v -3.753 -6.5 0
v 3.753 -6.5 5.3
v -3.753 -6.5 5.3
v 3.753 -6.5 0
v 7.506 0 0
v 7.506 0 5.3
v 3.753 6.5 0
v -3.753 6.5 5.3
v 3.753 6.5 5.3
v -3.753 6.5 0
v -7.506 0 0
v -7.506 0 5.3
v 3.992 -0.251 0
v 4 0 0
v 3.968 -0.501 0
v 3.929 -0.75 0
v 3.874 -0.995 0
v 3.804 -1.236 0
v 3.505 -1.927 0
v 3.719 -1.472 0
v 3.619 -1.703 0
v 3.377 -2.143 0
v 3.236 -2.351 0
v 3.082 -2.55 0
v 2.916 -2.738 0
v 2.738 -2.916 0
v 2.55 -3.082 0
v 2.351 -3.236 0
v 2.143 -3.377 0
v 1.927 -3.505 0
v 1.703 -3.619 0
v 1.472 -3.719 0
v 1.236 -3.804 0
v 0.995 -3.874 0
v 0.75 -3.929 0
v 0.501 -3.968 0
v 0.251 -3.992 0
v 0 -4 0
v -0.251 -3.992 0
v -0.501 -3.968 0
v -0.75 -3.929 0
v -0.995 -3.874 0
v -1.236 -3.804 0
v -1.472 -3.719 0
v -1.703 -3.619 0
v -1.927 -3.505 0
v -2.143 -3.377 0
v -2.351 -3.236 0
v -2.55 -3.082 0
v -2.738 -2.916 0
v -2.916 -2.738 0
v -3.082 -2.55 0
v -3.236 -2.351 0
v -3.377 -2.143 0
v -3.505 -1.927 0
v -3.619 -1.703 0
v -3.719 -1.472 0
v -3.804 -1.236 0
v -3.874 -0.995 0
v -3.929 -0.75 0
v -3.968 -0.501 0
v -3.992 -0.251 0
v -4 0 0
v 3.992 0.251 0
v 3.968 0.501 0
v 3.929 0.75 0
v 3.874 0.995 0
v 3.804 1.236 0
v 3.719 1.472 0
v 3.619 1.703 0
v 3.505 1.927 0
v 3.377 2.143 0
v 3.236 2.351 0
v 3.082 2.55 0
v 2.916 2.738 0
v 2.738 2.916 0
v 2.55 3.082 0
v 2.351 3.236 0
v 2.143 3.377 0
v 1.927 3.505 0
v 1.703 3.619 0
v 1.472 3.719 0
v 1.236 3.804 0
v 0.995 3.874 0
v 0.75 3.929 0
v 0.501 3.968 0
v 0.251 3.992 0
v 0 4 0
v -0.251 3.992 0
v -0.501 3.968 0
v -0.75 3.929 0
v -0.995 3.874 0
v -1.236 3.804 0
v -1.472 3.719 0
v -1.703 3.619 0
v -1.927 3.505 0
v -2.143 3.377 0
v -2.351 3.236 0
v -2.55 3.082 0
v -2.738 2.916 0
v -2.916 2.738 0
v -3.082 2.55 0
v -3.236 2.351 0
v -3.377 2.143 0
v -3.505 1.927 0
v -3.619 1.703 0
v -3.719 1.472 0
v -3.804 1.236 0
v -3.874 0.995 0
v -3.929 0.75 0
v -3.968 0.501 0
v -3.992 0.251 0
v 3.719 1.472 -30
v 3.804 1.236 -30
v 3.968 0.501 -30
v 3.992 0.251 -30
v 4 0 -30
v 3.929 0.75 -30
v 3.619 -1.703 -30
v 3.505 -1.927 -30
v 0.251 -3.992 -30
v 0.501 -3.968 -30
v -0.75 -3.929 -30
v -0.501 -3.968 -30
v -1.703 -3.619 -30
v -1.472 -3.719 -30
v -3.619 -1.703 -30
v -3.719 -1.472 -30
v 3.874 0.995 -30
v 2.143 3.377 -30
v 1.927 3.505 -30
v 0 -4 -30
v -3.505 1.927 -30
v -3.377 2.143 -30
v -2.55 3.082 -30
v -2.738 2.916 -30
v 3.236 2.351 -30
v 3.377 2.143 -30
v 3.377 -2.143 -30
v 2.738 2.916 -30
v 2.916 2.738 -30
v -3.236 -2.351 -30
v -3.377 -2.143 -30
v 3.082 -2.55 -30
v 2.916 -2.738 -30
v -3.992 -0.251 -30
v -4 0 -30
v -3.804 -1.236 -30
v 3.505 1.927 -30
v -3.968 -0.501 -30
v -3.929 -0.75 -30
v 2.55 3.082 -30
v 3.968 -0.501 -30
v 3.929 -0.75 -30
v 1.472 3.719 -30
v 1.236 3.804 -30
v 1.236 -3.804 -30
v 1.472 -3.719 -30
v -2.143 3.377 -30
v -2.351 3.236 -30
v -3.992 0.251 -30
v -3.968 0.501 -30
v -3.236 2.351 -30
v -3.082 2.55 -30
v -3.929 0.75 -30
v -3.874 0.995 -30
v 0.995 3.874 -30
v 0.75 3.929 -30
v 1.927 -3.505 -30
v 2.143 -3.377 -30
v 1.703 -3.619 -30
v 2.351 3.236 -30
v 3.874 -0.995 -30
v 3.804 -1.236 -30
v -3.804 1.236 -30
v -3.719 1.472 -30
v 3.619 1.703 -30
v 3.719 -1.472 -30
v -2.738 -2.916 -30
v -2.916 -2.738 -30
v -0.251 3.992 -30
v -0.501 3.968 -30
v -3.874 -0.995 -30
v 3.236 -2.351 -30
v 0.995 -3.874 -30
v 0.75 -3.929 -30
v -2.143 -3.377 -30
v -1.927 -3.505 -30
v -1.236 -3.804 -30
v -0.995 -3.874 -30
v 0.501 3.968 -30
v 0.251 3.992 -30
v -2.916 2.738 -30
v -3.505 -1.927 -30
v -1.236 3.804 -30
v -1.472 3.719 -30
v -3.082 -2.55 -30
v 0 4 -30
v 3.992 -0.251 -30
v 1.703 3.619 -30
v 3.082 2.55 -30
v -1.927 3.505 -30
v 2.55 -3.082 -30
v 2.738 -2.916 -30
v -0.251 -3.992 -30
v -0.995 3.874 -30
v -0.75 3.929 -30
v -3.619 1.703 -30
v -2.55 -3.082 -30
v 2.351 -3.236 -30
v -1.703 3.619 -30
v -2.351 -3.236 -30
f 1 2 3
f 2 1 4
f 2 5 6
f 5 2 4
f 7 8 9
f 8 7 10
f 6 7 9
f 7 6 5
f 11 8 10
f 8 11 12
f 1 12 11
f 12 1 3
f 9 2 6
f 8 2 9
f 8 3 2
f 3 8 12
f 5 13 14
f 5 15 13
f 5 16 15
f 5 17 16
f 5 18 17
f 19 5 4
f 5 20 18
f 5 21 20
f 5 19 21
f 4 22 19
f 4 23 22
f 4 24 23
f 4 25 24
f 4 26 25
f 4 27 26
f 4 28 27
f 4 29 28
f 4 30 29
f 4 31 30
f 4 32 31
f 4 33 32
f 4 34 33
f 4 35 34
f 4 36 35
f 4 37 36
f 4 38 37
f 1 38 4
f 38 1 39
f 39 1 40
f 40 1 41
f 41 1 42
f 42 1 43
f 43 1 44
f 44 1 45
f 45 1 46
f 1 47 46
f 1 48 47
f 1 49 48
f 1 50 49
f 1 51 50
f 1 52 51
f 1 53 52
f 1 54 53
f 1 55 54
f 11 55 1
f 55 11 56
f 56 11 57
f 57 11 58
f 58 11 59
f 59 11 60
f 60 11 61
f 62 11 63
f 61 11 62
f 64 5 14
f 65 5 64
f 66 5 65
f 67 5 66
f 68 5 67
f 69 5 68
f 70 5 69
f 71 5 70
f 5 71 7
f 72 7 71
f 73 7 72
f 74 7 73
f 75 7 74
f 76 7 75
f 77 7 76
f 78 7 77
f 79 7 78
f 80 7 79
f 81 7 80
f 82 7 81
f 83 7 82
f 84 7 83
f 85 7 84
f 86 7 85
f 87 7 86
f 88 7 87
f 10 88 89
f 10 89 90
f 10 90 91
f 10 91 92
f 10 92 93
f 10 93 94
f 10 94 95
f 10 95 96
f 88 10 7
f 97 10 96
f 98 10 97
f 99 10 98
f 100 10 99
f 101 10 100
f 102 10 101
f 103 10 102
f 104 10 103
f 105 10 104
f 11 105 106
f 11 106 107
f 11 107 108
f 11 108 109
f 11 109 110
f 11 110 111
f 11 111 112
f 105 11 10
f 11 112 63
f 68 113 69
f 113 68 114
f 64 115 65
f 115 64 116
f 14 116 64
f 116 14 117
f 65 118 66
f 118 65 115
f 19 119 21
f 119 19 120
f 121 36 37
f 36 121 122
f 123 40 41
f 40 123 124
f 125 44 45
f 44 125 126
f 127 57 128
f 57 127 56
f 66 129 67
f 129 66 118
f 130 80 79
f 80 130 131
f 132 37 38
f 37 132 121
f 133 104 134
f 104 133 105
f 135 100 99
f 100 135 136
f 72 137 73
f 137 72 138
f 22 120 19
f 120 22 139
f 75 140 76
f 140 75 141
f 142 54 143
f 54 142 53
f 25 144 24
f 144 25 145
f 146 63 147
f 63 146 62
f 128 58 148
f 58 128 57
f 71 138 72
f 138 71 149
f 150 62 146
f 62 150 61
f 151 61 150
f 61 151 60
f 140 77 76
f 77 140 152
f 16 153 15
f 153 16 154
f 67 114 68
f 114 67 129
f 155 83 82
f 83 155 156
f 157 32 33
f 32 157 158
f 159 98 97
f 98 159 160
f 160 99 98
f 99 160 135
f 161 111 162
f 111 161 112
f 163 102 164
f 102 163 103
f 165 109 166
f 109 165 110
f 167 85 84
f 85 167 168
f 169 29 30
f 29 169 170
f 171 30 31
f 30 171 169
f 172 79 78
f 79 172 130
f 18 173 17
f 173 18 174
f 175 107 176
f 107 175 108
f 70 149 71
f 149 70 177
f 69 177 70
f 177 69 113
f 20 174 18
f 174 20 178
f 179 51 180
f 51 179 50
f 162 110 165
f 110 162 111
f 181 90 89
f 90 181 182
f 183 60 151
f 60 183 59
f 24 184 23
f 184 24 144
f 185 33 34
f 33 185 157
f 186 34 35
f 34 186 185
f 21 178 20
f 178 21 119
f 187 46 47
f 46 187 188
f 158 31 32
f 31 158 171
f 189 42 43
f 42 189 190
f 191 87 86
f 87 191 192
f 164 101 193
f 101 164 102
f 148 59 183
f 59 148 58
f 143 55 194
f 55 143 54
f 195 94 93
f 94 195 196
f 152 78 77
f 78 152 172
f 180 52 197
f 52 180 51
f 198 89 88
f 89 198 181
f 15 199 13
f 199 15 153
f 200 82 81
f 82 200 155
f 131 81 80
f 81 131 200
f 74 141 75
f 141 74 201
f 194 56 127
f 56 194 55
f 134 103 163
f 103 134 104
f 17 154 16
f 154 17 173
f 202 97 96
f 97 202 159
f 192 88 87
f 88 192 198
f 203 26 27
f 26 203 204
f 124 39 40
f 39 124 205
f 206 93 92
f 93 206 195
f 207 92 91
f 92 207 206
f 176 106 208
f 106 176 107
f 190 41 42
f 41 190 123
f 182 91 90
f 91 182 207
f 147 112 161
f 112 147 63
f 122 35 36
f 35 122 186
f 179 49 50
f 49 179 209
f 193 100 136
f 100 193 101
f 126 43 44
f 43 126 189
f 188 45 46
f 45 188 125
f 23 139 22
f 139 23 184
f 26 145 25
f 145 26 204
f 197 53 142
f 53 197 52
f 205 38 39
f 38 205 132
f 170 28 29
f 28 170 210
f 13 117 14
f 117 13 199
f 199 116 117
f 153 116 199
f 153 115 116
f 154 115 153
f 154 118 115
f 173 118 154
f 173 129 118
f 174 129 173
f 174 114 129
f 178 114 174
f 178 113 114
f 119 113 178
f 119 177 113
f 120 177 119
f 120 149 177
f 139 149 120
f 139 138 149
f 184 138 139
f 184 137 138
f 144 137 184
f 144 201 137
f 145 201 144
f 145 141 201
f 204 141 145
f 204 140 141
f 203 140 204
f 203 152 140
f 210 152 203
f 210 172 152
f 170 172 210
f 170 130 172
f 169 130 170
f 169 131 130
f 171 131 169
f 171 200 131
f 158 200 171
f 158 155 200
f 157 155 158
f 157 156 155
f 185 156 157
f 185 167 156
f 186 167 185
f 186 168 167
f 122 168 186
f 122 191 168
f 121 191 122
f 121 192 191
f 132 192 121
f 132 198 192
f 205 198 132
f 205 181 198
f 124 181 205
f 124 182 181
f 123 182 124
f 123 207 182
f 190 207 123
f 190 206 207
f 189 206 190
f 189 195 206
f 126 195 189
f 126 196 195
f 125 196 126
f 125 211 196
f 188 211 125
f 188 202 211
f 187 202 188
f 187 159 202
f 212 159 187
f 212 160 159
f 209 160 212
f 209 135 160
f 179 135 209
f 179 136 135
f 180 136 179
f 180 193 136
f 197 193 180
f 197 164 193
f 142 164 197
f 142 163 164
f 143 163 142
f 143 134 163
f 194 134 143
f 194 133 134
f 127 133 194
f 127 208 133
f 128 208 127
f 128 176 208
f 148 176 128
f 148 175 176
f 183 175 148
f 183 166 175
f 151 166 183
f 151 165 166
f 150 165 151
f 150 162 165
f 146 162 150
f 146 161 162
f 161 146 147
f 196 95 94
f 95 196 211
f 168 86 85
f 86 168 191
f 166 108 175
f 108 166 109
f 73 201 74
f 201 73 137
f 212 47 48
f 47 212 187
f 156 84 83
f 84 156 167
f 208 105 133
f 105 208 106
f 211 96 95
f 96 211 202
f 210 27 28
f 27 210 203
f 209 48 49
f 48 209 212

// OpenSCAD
// M8 六角ボルト (JIS規格ベース、ねじ山省略)
// `$fn = 100;` で円や六角形の解像度を上げています。

module m8_bolt() {
    // 頭部 (対辺距離 13mm の六角柱、高さ 5.3mm)
    // OpenSCad の cylinder(r/d, h) で $fn=6 を指定すると六角柱になります。
    // 対辺距離(S)から外接円の半径を計算: R = S / sqrt(3) 
    // 13 / 1.7320508... ≒ 7.5055mm (直径では約 15.01mm)
    // ※あるいは circum(r) を使う簡易的な方法として d = 13 / cos(30) = 15.011 も可
    // ここでは正確に対辺距離 13mm になるよう三角関数を使用します。
    
    af = 13; // 対辺距離
    outer_d = af / cos(30); // 外接円の直径
    head_height = 5.3;
    
    shank_d = 8;
    shank_length = 30;

    // 1. 頭部 (底面が z = 0、Z軸正方向へ高さ 5.3mm)
    color("Silver")
    cylinder(h = head_height, d = outer_d, $fn = 6);

    // 2. シャンク / 軸部 (直径 8mm、長さ 30mm、Z軸負方向へ伸ばす)
    color("Silver")
    translate([0, 0, -shank_length])
    cylinder(h = shank_length, d = shank_d, $fn = 100);
}

m8_bolt();
